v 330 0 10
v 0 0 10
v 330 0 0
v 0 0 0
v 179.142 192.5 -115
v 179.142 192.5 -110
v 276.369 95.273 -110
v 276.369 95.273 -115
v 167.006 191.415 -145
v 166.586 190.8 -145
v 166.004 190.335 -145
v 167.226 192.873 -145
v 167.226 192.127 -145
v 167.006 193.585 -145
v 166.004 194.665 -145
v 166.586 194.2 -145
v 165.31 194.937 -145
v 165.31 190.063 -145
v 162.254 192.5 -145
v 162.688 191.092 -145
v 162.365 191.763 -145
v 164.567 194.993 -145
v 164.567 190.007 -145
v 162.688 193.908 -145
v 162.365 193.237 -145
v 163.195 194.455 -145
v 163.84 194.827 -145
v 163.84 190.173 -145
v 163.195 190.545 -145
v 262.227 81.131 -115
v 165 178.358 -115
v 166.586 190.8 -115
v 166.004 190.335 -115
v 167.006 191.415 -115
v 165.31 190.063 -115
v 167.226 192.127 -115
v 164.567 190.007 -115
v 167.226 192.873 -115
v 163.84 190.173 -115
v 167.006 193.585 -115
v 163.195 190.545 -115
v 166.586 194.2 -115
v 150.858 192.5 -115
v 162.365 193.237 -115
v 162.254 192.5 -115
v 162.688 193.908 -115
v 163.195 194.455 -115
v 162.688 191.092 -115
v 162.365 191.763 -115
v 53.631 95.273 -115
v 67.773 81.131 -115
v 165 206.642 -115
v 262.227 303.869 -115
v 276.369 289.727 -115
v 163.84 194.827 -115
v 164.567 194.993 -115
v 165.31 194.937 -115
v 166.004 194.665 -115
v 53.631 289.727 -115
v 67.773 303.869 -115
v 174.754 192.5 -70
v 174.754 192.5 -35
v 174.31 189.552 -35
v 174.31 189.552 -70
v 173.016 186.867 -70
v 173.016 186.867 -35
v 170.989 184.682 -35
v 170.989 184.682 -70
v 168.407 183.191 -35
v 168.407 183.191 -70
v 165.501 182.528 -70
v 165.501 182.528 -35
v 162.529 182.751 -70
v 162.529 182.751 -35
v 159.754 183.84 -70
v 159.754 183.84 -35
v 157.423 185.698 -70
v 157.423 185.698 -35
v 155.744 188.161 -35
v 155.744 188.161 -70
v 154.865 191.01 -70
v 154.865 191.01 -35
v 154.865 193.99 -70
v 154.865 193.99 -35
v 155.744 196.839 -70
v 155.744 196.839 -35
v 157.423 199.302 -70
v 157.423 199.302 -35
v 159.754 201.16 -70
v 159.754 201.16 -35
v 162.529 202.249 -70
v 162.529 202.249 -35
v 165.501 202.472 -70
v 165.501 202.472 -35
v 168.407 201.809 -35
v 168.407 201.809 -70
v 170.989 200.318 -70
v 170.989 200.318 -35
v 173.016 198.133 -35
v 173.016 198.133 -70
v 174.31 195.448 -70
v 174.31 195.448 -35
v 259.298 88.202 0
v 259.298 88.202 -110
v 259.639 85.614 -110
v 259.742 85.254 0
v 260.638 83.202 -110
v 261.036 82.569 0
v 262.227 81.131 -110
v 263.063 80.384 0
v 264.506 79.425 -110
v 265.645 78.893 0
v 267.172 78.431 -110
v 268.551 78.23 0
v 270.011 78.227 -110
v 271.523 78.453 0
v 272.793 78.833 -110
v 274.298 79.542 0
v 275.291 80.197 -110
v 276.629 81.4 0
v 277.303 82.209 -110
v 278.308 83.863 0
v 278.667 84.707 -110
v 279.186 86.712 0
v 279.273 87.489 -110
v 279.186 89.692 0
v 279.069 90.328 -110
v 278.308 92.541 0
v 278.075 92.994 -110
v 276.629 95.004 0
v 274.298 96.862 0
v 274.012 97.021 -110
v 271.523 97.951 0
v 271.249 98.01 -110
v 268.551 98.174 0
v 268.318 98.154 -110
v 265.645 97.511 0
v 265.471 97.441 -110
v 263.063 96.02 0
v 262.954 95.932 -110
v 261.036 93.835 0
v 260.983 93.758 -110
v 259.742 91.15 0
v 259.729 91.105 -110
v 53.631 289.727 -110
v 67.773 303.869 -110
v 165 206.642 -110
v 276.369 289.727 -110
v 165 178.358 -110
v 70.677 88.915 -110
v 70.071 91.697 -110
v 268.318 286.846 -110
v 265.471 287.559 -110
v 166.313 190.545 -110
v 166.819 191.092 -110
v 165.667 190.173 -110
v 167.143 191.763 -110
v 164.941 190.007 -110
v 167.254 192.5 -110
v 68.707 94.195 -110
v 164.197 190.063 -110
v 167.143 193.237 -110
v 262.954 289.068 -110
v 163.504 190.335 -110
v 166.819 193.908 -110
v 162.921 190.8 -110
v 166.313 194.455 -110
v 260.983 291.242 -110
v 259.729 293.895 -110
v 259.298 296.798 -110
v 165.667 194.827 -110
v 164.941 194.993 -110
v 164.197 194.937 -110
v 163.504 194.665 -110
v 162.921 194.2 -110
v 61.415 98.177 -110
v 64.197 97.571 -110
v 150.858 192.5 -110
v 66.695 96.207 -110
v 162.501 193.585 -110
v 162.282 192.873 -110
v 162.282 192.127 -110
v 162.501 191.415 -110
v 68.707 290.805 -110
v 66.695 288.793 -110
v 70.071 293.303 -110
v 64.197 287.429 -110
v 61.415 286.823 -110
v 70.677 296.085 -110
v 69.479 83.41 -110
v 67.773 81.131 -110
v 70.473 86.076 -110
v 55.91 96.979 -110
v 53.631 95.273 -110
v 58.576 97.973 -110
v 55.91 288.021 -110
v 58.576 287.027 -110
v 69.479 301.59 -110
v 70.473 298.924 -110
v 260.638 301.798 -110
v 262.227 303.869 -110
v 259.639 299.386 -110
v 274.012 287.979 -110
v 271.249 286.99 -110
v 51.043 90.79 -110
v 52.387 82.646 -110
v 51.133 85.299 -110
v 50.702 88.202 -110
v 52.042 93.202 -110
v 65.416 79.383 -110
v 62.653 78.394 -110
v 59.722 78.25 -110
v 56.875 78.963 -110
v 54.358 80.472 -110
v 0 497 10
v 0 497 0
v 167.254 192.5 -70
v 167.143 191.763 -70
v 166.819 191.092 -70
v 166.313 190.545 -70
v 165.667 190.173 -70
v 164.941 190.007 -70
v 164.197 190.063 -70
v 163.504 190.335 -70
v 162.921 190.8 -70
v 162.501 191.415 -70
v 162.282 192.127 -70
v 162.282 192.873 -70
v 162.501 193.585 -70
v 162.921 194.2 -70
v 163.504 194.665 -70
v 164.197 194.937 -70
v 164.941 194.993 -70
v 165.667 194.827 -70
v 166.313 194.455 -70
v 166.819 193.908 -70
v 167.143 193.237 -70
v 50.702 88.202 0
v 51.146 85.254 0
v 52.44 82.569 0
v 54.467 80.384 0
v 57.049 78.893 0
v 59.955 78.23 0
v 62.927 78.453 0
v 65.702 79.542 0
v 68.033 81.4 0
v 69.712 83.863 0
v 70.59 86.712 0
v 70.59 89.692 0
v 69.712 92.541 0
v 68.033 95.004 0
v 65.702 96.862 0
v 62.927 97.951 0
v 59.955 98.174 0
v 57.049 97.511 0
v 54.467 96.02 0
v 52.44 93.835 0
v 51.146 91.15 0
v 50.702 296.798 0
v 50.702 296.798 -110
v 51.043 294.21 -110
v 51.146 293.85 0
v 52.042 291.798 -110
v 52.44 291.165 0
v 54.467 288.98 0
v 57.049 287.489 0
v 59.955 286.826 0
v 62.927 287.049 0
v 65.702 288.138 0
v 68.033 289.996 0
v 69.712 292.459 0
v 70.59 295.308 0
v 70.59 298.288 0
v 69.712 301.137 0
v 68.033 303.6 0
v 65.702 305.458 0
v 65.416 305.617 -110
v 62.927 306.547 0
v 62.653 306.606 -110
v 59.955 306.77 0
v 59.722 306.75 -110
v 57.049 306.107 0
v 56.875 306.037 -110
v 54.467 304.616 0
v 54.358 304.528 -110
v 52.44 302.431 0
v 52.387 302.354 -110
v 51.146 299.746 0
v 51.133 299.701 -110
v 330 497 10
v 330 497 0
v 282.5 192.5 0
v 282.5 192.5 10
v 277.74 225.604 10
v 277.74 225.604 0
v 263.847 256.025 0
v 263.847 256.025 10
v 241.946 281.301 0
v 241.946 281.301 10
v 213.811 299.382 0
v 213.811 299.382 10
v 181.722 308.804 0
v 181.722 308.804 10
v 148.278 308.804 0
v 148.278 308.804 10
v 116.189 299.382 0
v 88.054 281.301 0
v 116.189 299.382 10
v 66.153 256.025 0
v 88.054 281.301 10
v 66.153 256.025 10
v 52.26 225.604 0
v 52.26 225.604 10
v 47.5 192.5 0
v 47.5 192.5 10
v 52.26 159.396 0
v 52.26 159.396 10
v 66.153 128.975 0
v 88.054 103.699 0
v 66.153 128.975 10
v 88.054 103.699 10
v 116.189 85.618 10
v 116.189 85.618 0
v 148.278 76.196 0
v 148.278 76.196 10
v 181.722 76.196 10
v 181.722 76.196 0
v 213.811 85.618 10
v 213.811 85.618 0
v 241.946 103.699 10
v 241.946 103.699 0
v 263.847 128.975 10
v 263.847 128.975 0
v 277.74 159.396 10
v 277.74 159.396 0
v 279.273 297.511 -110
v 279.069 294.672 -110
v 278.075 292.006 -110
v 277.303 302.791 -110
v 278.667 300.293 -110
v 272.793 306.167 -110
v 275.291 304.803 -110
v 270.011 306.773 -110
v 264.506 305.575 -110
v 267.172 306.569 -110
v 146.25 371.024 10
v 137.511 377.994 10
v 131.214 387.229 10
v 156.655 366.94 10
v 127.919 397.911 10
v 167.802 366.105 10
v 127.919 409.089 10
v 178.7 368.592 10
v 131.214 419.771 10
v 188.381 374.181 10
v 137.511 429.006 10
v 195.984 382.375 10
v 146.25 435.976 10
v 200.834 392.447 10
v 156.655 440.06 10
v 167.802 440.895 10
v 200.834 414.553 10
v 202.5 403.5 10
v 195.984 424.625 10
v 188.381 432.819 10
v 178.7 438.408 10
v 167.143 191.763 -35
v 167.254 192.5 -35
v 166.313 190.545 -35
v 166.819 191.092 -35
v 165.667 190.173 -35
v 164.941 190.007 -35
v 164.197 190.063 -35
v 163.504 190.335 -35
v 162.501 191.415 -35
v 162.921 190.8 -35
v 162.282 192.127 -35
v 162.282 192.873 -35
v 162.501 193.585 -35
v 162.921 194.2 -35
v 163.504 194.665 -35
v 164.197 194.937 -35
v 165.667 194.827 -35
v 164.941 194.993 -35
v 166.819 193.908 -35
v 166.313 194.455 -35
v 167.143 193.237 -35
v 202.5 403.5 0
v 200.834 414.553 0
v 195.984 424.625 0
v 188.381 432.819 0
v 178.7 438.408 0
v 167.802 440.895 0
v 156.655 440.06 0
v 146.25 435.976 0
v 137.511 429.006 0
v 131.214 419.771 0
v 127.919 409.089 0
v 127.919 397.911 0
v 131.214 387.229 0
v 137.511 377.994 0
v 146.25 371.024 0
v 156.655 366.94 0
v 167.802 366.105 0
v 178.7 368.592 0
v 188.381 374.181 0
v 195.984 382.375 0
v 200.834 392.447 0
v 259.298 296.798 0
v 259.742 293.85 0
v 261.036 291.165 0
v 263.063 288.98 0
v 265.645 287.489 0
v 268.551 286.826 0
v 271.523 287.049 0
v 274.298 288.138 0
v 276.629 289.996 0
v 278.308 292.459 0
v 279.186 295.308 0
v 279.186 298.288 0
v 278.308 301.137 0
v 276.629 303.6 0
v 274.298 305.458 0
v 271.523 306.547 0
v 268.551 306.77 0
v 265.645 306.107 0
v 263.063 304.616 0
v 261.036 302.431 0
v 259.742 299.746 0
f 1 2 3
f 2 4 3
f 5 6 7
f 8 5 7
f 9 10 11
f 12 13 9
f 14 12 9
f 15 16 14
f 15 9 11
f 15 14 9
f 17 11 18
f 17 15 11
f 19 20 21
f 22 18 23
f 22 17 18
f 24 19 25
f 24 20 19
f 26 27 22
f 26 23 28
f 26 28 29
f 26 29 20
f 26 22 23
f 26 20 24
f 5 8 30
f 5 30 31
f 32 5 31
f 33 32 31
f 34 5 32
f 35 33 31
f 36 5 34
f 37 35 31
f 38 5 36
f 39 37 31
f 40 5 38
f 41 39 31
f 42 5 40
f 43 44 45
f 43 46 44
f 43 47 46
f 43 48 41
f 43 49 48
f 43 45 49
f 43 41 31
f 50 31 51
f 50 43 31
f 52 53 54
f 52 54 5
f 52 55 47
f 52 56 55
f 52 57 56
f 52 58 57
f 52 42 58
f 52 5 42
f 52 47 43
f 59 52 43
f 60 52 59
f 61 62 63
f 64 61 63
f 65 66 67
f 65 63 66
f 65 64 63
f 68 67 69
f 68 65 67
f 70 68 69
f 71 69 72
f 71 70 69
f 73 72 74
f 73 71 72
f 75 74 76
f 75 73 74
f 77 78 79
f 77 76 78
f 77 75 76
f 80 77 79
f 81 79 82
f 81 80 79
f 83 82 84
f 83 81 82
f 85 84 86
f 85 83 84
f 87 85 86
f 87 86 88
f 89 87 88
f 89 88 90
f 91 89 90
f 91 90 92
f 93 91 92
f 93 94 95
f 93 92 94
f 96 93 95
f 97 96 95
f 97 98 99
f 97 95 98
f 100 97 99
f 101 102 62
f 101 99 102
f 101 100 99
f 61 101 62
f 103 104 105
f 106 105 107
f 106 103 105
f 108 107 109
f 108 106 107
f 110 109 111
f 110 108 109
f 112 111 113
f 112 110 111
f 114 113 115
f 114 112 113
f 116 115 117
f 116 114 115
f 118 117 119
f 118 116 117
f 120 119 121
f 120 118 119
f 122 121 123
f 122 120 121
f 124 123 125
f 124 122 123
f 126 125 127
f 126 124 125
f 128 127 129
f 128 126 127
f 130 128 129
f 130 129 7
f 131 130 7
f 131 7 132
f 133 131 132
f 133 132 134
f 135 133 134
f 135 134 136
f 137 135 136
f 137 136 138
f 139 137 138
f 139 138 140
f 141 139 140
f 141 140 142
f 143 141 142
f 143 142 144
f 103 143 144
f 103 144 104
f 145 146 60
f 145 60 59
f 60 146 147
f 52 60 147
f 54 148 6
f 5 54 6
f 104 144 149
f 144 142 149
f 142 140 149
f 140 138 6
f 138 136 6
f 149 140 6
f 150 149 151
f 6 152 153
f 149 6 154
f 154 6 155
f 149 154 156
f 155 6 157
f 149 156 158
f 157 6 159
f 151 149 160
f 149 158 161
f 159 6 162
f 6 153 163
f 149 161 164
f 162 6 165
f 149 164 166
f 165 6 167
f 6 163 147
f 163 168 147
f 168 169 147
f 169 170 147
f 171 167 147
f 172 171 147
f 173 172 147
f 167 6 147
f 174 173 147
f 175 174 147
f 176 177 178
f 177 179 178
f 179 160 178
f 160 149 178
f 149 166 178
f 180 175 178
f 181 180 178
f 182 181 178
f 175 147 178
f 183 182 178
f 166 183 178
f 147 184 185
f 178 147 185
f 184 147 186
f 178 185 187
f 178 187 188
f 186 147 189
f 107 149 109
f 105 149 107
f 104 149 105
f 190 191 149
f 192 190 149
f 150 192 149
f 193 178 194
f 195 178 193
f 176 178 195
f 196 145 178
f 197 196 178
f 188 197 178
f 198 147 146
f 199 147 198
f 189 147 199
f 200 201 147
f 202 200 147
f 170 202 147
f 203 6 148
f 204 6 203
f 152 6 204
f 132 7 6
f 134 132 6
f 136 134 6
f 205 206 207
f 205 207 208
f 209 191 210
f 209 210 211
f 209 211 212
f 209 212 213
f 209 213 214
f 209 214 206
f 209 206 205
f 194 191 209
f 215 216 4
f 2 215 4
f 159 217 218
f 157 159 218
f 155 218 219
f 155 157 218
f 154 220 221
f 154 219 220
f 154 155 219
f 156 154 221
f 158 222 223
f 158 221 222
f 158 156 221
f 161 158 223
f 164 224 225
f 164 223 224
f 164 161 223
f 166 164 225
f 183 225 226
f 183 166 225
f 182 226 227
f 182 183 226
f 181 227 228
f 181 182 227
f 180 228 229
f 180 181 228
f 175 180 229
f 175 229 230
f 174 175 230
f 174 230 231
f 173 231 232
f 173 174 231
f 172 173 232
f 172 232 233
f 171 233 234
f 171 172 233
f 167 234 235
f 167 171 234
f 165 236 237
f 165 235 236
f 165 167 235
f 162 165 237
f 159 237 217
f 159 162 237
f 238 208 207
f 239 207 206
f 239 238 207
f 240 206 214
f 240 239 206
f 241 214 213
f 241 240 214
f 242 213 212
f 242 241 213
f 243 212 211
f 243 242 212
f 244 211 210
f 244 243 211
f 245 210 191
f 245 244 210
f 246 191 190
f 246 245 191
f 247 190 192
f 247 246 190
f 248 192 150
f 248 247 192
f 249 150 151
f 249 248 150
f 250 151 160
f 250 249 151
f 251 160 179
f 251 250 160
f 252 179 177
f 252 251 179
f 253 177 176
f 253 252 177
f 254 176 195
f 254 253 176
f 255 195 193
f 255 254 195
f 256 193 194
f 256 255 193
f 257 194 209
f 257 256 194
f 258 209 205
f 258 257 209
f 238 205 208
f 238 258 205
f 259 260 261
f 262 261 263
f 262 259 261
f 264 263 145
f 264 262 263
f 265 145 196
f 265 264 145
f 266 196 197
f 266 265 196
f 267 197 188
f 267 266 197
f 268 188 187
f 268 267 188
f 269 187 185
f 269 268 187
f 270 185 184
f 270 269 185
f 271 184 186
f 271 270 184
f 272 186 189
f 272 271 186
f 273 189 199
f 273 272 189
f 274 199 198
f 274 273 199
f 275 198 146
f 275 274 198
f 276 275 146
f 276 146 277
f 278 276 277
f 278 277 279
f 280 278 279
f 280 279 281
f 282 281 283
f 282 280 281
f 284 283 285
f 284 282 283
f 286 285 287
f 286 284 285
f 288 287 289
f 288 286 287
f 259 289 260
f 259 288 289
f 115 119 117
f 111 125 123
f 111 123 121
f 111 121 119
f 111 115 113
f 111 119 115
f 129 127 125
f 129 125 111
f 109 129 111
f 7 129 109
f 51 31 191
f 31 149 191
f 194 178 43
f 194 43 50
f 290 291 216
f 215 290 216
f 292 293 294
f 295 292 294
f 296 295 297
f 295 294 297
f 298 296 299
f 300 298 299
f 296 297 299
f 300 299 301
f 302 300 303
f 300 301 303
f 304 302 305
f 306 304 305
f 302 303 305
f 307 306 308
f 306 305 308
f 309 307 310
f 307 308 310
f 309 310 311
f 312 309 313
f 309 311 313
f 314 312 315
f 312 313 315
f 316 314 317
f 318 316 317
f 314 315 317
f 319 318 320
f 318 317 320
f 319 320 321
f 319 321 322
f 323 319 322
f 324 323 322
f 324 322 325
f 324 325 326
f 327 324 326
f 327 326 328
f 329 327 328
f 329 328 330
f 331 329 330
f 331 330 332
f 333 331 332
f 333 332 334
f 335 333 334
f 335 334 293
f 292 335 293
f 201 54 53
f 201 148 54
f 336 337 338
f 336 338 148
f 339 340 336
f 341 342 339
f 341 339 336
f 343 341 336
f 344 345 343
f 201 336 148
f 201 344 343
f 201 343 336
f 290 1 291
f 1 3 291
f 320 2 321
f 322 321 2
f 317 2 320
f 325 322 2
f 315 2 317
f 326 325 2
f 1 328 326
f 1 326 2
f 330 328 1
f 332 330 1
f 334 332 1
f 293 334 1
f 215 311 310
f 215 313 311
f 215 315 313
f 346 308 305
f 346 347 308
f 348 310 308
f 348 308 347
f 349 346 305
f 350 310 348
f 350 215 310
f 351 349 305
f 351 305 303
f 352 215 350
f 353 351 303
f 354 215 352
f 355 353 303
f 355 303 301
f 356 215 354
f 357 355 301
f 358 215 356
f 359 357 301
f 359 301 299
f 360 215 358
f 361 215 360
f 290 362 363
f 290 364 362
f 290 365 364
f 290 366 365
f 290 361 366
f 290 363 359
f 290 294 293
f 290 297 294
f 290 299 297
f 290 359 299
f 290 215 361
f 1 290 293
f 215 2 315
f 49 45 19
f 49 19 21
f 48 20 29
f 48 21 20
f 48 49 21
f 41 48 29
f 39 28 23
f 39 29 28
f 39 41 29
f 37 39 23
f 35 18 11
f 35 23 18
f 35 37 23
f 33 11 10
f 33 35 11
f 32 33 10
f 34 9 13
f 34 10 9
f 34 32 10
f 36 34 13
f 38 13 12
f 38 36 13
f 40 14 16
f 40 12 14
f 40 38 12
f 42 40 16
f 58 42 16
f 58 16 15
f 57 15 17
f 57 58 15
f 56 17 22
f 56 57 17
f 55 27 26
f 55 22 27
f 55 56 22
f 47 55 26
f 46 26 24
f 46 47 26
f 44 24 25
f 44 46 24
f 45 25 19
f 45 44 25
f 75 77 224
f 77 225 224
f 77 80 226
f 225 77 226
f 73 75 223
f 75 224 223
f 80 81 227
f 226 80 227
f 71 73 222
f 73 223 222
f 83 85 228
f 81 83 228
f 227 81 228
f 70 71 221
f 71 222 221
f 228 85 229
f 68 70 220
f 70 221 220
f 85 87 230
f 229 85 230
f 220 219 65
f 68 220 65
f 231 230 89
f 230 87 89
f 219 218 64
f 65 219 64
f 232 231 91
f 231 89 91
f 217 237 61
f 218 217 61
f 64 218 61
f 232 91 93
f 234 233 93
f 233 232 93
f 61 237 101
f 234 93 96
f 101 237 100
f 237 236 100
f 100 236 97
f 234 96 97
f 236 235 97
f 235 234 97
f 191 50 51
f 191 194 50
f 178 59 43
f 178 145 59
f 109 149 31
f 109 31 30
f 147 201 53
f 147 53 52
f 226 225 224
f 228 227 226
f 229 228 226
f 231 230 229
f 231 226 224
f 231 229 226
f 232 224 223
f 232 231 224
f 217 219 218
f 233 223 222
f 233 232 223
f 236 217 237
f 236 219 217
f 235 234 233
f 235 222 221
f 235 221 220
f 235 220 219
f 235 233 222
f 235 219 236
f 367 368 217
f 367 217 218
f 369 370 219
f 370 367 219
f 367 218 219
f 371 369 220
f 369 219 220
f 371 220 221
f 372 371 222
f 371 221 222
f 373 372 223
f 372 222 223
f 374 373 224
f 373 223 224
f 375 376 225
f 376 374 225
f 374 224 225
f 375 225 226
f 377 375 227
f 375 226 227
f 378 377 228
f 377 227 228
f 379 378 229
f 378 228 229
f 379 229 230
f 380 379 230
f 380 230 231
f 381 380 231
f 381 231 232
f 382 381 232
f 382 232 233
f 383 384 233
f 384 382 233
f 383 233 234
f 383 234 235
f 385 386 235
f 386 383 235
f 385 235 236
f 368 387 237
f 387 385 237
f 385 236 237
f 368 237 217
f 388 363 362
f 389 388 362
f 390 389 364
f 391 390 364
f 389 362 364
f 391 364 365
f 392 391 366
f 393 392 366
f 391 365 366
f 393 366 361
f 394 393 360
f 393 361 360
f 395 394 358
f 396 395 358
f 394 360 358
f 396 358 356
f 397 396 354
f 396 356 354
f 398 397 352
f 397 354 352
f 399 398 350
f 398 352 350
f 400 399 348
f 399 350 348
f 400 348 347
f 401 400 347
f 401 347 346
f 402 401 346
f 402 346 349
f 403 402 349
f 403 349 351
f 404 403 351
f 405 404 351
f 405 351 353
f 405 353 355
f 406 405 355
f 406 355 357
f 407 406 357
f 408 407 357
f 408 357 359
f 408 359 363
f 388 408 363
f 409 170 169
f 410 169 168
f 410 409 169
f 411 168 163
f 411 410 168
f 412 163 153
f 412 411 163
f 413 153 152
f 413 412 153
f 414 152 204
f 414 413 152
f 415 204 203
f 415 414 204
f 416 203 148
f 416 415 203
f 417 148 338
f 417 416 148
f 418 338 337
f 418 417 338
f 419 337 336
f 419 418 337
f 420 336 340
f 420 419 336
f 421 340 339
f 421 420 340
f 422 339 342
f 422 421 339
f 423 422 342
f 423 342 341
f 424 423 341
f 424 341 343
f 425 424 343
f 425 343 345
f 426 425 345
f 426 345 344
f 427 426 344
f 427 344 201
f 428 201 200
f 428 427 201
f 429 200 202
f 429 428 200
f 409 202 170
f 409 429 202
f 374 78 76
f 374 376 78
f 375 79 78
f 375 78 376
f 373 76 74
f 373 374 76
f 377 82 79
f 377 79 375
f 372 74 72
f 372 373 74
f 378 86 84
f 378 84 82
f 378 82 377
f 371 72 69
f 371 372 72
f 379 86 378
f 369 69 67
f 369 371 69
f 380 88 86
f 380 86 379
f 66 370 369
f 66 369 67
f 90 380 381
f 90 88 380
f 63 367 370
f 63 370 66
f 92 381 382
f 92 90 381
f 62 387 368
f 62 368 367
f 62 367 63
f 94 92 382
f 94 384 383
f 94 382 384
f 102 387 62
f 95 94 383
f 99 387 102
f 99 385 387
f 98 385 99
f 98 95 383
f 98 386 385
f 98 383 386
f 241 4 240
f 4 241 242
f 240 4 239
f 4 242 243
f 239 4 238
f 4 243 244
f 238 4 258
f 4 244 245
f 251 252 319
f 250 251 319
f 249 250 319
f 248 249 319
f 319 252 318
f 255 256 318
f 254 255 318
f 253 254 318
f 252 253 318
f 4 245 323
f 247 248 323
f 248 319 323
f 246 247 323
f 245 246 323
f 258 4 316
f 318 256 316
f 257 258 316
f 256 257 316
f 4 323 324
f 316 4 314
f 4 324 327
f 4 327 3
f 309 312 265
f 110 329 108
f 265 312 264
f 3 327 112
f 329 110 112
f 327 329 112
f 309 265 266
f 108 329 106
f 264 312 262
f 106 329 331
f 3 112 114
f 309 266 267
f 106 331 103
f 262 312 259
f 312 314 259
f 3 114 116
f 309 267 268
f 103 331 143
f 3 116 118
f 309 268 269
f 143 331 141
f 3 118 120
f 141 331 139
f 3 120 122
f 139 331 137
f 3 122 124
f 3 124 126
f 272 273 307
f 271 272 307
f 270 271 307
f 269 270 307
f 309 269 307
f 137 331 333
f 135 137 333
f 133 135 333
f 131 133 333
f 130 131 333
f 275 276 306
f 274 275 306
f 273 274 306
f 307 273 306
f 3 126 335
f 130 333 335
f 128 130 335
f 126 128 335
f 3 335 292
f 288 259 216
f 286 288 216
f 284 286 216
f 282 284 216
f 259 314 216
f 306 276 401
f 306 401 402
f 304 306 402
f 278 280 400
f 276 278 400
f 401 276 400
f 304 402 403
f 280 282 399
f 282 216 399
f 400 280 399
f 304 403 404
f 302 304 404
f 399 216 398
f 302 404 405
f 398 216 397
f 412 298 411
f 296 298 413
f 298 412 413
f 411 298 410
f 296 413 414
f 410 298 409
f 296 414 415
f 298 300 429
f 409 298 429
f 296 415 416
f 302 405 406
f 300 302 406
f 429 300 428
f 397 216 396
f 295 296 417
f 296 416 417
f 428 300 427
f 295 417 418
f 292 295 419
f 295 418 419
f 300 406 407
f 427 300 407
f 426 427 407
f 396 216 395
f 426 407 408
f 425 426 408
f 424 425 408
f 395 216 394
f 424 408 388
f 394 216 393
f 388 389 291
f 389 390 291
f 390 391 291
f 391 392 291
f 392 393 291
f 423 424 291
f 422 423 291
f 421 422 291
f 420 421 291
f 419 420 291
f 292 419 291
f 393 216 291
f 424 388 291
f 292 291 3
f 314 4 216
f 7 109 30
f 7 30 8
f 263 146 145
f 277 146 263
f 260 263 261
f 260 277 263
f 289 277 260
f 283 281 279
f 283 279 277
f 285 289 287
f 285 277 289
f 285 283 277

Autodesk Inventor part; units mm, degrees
ref_plane "YZ Plane" through (0, 0, 0) normal (1, 0, 0) x (0, 1, 0)
ref_plane "XZ Plane" through (0, 0, 0) normal (0, 1, 0) x (-1, 0, 0)
ref_plane "XY Plane" through (0, 0, 0) normal (0, 0, 1) x (1, 0, 0)
sketch "Sketch1" plane through (0, 0, 0) normal (0, 0, 1) x (1, 0, 0)
  line L0 (0, 0) -> (330, 0)
  line L1 (330, 0) -> (330, 497)
  line L2 (330, 497) -> (0, 497)
  line L3 (0, 497) -> (0, 0)
  dimension "d0" = 330
  dimension "d1" = 497
extrude "Extrusion1" add sketch "Sketch1" along normal blind 10
sketch "Sketch2" plane through (0, 0, 10) normal (0, 0, 1) x (1, 0, 0)
  circle A0 centre (165, 192.5) radius 117.5
  point P0 (0, 0)
  dimension "d4" = 235
extrude "Extrusion2" cut sketch "Sketch2" against normal blind 10
sketch "Sketch3" plane through (0, 0, 10) normal (0, 0, 1) x (1, 0, 0)
  circle A0 centre (165, 403.5) radius 37.5
  point P0 (0, 0)
  dimension "d7" = 75
extrude "Extrusion3" cut sketch "Sketch3" against normal blind 10
sketch "Sketch4" plane through (0, 0, 0) normal (0, 0, -1) x (-1, 0, 0)
  circle A0 centre (-269.298, 296.798) radius 10
  circle A1 centre (-165, 192.5) radius 117.5 projected
  circle A2 centre (-269.298, 88.202) radius 10
  circle A3 centre (-60.702, 88.202) radius 10
  circle A4 centre (-60.702, 296.798) radius 10
  point P0 (0, 0)
  dimension "d10" = 20
  dimension "d13" = 360
extrude "Extrusion4" add sketch "Sketch4" along normal blind 110 contours A0 | A2 | A3 | A4
sketch "Sketch5" plane through (269.298, 296.798, -110) normal (0, 0, -1) x (-1, 0, 0)
  circle A0 centre (208.596, 0) radius 10 projected
  circle A1 centre (0, -208.596) radius 10 projected
  line L0 (215.6671, -7.0711) -> (7.0711, -215.6671)
  line L1 (201.5249, 7.0711) -> (-7.0711, -201.5249)
  line L2 (7.0711, -215.6671) -> (-7.0711, -201.5249)
  line L3 (201.5249, 7.0711) -> (215.6671, -7.0711)
  circle A2 centre (104.298, -104.298) radius 117.5 projected
  line L4 (7.0711, 7.0711) -> (215.6671, -201.5249)
  line L5 (215.6671, -201.5249) -> (201.5249, -215.6671)
  line L6 (-7.0711, -7.0711) -> (201.5249, -215.6671)
  line L7 (-7.0711, -7.0711) -> (7.0711, 7.0711)
  point P0 (269.298, -296.798)
  point P1 (90.1559, -104.298)
  point P2 (-7.0711, -201.5249)
  point P3 (7.0711, -215.6671)
  point P4 (104.298, -118.4401)
  point P5 (118.4401, -104.298)
  point P6 (215.6671, -7.0711)
  point P7 (104.298, -90.1559)
  point P8 (-7.0711, -201.5249)
  point P9 (7.0711, -215.6671)
  dimension "d21" = 90
extrude "Extrusion5" add sketch "Sketch5" along normal blind 5 contours L3 A0 | A0 L0 A2 L1 | A2 L0 L4 L1 | L4 L0 L6 L1 | L1 L6 A2 L4 | A2 L6 L7 L4 | L4 A2 L6 L0 | L6 L0 A2 L1 | L4 L5 L6 A2 | A2 L0 A1 L1 | A1 L2 picked at (207.6691, -4.4554) picked at (2.263, -203.9854)
sketch "Sketch7" plane through (269.298, 296.798, -115) normal (0, 0, -1) x (-1, 0, 0)
  line L0 (90.1559, -104.298) -> (-7.0711, -201.5249) projected
  circle A0 centre (104.5442, -104.298) radius 2.5
  point P0 (269.298, -296.798)
  point P1 (104.298, -118.4401)
  point P2 (104.298, -90.1559)
  dimension "d25" = 5
extrude "Extrusion6" add sketch "Sketch7" along normal blind 30
sketch "Sketch8" plane through (269.298, 296.798, -110) normal (0, 0, 1) x (1, 0, 0)
  circle A0 centre (-104.5442, -104.298) radius 2.5 projected
  circle A1 centre (-104.5442, -104.298) radius 2.5
  point P0 (-269.298, -296.798)
extrude "Extrusion7" add sketch "Sketch8" along normal blind 40
sketch "Sketch9" plane through (164.7538, 192.5, -70) normal (0, 0, 1) x (1, 0, 0)
  circle A0 centre (0, 0) radius 2.5 projected
  circle A1 centre (0, 0) radius 10
  point P0 (-164.7538, -192.5)
  dimension "d30" = 20
extrude "Extrusion8" add sketch "Sketch9" along normal blind 35
properties part number "box_cover"
